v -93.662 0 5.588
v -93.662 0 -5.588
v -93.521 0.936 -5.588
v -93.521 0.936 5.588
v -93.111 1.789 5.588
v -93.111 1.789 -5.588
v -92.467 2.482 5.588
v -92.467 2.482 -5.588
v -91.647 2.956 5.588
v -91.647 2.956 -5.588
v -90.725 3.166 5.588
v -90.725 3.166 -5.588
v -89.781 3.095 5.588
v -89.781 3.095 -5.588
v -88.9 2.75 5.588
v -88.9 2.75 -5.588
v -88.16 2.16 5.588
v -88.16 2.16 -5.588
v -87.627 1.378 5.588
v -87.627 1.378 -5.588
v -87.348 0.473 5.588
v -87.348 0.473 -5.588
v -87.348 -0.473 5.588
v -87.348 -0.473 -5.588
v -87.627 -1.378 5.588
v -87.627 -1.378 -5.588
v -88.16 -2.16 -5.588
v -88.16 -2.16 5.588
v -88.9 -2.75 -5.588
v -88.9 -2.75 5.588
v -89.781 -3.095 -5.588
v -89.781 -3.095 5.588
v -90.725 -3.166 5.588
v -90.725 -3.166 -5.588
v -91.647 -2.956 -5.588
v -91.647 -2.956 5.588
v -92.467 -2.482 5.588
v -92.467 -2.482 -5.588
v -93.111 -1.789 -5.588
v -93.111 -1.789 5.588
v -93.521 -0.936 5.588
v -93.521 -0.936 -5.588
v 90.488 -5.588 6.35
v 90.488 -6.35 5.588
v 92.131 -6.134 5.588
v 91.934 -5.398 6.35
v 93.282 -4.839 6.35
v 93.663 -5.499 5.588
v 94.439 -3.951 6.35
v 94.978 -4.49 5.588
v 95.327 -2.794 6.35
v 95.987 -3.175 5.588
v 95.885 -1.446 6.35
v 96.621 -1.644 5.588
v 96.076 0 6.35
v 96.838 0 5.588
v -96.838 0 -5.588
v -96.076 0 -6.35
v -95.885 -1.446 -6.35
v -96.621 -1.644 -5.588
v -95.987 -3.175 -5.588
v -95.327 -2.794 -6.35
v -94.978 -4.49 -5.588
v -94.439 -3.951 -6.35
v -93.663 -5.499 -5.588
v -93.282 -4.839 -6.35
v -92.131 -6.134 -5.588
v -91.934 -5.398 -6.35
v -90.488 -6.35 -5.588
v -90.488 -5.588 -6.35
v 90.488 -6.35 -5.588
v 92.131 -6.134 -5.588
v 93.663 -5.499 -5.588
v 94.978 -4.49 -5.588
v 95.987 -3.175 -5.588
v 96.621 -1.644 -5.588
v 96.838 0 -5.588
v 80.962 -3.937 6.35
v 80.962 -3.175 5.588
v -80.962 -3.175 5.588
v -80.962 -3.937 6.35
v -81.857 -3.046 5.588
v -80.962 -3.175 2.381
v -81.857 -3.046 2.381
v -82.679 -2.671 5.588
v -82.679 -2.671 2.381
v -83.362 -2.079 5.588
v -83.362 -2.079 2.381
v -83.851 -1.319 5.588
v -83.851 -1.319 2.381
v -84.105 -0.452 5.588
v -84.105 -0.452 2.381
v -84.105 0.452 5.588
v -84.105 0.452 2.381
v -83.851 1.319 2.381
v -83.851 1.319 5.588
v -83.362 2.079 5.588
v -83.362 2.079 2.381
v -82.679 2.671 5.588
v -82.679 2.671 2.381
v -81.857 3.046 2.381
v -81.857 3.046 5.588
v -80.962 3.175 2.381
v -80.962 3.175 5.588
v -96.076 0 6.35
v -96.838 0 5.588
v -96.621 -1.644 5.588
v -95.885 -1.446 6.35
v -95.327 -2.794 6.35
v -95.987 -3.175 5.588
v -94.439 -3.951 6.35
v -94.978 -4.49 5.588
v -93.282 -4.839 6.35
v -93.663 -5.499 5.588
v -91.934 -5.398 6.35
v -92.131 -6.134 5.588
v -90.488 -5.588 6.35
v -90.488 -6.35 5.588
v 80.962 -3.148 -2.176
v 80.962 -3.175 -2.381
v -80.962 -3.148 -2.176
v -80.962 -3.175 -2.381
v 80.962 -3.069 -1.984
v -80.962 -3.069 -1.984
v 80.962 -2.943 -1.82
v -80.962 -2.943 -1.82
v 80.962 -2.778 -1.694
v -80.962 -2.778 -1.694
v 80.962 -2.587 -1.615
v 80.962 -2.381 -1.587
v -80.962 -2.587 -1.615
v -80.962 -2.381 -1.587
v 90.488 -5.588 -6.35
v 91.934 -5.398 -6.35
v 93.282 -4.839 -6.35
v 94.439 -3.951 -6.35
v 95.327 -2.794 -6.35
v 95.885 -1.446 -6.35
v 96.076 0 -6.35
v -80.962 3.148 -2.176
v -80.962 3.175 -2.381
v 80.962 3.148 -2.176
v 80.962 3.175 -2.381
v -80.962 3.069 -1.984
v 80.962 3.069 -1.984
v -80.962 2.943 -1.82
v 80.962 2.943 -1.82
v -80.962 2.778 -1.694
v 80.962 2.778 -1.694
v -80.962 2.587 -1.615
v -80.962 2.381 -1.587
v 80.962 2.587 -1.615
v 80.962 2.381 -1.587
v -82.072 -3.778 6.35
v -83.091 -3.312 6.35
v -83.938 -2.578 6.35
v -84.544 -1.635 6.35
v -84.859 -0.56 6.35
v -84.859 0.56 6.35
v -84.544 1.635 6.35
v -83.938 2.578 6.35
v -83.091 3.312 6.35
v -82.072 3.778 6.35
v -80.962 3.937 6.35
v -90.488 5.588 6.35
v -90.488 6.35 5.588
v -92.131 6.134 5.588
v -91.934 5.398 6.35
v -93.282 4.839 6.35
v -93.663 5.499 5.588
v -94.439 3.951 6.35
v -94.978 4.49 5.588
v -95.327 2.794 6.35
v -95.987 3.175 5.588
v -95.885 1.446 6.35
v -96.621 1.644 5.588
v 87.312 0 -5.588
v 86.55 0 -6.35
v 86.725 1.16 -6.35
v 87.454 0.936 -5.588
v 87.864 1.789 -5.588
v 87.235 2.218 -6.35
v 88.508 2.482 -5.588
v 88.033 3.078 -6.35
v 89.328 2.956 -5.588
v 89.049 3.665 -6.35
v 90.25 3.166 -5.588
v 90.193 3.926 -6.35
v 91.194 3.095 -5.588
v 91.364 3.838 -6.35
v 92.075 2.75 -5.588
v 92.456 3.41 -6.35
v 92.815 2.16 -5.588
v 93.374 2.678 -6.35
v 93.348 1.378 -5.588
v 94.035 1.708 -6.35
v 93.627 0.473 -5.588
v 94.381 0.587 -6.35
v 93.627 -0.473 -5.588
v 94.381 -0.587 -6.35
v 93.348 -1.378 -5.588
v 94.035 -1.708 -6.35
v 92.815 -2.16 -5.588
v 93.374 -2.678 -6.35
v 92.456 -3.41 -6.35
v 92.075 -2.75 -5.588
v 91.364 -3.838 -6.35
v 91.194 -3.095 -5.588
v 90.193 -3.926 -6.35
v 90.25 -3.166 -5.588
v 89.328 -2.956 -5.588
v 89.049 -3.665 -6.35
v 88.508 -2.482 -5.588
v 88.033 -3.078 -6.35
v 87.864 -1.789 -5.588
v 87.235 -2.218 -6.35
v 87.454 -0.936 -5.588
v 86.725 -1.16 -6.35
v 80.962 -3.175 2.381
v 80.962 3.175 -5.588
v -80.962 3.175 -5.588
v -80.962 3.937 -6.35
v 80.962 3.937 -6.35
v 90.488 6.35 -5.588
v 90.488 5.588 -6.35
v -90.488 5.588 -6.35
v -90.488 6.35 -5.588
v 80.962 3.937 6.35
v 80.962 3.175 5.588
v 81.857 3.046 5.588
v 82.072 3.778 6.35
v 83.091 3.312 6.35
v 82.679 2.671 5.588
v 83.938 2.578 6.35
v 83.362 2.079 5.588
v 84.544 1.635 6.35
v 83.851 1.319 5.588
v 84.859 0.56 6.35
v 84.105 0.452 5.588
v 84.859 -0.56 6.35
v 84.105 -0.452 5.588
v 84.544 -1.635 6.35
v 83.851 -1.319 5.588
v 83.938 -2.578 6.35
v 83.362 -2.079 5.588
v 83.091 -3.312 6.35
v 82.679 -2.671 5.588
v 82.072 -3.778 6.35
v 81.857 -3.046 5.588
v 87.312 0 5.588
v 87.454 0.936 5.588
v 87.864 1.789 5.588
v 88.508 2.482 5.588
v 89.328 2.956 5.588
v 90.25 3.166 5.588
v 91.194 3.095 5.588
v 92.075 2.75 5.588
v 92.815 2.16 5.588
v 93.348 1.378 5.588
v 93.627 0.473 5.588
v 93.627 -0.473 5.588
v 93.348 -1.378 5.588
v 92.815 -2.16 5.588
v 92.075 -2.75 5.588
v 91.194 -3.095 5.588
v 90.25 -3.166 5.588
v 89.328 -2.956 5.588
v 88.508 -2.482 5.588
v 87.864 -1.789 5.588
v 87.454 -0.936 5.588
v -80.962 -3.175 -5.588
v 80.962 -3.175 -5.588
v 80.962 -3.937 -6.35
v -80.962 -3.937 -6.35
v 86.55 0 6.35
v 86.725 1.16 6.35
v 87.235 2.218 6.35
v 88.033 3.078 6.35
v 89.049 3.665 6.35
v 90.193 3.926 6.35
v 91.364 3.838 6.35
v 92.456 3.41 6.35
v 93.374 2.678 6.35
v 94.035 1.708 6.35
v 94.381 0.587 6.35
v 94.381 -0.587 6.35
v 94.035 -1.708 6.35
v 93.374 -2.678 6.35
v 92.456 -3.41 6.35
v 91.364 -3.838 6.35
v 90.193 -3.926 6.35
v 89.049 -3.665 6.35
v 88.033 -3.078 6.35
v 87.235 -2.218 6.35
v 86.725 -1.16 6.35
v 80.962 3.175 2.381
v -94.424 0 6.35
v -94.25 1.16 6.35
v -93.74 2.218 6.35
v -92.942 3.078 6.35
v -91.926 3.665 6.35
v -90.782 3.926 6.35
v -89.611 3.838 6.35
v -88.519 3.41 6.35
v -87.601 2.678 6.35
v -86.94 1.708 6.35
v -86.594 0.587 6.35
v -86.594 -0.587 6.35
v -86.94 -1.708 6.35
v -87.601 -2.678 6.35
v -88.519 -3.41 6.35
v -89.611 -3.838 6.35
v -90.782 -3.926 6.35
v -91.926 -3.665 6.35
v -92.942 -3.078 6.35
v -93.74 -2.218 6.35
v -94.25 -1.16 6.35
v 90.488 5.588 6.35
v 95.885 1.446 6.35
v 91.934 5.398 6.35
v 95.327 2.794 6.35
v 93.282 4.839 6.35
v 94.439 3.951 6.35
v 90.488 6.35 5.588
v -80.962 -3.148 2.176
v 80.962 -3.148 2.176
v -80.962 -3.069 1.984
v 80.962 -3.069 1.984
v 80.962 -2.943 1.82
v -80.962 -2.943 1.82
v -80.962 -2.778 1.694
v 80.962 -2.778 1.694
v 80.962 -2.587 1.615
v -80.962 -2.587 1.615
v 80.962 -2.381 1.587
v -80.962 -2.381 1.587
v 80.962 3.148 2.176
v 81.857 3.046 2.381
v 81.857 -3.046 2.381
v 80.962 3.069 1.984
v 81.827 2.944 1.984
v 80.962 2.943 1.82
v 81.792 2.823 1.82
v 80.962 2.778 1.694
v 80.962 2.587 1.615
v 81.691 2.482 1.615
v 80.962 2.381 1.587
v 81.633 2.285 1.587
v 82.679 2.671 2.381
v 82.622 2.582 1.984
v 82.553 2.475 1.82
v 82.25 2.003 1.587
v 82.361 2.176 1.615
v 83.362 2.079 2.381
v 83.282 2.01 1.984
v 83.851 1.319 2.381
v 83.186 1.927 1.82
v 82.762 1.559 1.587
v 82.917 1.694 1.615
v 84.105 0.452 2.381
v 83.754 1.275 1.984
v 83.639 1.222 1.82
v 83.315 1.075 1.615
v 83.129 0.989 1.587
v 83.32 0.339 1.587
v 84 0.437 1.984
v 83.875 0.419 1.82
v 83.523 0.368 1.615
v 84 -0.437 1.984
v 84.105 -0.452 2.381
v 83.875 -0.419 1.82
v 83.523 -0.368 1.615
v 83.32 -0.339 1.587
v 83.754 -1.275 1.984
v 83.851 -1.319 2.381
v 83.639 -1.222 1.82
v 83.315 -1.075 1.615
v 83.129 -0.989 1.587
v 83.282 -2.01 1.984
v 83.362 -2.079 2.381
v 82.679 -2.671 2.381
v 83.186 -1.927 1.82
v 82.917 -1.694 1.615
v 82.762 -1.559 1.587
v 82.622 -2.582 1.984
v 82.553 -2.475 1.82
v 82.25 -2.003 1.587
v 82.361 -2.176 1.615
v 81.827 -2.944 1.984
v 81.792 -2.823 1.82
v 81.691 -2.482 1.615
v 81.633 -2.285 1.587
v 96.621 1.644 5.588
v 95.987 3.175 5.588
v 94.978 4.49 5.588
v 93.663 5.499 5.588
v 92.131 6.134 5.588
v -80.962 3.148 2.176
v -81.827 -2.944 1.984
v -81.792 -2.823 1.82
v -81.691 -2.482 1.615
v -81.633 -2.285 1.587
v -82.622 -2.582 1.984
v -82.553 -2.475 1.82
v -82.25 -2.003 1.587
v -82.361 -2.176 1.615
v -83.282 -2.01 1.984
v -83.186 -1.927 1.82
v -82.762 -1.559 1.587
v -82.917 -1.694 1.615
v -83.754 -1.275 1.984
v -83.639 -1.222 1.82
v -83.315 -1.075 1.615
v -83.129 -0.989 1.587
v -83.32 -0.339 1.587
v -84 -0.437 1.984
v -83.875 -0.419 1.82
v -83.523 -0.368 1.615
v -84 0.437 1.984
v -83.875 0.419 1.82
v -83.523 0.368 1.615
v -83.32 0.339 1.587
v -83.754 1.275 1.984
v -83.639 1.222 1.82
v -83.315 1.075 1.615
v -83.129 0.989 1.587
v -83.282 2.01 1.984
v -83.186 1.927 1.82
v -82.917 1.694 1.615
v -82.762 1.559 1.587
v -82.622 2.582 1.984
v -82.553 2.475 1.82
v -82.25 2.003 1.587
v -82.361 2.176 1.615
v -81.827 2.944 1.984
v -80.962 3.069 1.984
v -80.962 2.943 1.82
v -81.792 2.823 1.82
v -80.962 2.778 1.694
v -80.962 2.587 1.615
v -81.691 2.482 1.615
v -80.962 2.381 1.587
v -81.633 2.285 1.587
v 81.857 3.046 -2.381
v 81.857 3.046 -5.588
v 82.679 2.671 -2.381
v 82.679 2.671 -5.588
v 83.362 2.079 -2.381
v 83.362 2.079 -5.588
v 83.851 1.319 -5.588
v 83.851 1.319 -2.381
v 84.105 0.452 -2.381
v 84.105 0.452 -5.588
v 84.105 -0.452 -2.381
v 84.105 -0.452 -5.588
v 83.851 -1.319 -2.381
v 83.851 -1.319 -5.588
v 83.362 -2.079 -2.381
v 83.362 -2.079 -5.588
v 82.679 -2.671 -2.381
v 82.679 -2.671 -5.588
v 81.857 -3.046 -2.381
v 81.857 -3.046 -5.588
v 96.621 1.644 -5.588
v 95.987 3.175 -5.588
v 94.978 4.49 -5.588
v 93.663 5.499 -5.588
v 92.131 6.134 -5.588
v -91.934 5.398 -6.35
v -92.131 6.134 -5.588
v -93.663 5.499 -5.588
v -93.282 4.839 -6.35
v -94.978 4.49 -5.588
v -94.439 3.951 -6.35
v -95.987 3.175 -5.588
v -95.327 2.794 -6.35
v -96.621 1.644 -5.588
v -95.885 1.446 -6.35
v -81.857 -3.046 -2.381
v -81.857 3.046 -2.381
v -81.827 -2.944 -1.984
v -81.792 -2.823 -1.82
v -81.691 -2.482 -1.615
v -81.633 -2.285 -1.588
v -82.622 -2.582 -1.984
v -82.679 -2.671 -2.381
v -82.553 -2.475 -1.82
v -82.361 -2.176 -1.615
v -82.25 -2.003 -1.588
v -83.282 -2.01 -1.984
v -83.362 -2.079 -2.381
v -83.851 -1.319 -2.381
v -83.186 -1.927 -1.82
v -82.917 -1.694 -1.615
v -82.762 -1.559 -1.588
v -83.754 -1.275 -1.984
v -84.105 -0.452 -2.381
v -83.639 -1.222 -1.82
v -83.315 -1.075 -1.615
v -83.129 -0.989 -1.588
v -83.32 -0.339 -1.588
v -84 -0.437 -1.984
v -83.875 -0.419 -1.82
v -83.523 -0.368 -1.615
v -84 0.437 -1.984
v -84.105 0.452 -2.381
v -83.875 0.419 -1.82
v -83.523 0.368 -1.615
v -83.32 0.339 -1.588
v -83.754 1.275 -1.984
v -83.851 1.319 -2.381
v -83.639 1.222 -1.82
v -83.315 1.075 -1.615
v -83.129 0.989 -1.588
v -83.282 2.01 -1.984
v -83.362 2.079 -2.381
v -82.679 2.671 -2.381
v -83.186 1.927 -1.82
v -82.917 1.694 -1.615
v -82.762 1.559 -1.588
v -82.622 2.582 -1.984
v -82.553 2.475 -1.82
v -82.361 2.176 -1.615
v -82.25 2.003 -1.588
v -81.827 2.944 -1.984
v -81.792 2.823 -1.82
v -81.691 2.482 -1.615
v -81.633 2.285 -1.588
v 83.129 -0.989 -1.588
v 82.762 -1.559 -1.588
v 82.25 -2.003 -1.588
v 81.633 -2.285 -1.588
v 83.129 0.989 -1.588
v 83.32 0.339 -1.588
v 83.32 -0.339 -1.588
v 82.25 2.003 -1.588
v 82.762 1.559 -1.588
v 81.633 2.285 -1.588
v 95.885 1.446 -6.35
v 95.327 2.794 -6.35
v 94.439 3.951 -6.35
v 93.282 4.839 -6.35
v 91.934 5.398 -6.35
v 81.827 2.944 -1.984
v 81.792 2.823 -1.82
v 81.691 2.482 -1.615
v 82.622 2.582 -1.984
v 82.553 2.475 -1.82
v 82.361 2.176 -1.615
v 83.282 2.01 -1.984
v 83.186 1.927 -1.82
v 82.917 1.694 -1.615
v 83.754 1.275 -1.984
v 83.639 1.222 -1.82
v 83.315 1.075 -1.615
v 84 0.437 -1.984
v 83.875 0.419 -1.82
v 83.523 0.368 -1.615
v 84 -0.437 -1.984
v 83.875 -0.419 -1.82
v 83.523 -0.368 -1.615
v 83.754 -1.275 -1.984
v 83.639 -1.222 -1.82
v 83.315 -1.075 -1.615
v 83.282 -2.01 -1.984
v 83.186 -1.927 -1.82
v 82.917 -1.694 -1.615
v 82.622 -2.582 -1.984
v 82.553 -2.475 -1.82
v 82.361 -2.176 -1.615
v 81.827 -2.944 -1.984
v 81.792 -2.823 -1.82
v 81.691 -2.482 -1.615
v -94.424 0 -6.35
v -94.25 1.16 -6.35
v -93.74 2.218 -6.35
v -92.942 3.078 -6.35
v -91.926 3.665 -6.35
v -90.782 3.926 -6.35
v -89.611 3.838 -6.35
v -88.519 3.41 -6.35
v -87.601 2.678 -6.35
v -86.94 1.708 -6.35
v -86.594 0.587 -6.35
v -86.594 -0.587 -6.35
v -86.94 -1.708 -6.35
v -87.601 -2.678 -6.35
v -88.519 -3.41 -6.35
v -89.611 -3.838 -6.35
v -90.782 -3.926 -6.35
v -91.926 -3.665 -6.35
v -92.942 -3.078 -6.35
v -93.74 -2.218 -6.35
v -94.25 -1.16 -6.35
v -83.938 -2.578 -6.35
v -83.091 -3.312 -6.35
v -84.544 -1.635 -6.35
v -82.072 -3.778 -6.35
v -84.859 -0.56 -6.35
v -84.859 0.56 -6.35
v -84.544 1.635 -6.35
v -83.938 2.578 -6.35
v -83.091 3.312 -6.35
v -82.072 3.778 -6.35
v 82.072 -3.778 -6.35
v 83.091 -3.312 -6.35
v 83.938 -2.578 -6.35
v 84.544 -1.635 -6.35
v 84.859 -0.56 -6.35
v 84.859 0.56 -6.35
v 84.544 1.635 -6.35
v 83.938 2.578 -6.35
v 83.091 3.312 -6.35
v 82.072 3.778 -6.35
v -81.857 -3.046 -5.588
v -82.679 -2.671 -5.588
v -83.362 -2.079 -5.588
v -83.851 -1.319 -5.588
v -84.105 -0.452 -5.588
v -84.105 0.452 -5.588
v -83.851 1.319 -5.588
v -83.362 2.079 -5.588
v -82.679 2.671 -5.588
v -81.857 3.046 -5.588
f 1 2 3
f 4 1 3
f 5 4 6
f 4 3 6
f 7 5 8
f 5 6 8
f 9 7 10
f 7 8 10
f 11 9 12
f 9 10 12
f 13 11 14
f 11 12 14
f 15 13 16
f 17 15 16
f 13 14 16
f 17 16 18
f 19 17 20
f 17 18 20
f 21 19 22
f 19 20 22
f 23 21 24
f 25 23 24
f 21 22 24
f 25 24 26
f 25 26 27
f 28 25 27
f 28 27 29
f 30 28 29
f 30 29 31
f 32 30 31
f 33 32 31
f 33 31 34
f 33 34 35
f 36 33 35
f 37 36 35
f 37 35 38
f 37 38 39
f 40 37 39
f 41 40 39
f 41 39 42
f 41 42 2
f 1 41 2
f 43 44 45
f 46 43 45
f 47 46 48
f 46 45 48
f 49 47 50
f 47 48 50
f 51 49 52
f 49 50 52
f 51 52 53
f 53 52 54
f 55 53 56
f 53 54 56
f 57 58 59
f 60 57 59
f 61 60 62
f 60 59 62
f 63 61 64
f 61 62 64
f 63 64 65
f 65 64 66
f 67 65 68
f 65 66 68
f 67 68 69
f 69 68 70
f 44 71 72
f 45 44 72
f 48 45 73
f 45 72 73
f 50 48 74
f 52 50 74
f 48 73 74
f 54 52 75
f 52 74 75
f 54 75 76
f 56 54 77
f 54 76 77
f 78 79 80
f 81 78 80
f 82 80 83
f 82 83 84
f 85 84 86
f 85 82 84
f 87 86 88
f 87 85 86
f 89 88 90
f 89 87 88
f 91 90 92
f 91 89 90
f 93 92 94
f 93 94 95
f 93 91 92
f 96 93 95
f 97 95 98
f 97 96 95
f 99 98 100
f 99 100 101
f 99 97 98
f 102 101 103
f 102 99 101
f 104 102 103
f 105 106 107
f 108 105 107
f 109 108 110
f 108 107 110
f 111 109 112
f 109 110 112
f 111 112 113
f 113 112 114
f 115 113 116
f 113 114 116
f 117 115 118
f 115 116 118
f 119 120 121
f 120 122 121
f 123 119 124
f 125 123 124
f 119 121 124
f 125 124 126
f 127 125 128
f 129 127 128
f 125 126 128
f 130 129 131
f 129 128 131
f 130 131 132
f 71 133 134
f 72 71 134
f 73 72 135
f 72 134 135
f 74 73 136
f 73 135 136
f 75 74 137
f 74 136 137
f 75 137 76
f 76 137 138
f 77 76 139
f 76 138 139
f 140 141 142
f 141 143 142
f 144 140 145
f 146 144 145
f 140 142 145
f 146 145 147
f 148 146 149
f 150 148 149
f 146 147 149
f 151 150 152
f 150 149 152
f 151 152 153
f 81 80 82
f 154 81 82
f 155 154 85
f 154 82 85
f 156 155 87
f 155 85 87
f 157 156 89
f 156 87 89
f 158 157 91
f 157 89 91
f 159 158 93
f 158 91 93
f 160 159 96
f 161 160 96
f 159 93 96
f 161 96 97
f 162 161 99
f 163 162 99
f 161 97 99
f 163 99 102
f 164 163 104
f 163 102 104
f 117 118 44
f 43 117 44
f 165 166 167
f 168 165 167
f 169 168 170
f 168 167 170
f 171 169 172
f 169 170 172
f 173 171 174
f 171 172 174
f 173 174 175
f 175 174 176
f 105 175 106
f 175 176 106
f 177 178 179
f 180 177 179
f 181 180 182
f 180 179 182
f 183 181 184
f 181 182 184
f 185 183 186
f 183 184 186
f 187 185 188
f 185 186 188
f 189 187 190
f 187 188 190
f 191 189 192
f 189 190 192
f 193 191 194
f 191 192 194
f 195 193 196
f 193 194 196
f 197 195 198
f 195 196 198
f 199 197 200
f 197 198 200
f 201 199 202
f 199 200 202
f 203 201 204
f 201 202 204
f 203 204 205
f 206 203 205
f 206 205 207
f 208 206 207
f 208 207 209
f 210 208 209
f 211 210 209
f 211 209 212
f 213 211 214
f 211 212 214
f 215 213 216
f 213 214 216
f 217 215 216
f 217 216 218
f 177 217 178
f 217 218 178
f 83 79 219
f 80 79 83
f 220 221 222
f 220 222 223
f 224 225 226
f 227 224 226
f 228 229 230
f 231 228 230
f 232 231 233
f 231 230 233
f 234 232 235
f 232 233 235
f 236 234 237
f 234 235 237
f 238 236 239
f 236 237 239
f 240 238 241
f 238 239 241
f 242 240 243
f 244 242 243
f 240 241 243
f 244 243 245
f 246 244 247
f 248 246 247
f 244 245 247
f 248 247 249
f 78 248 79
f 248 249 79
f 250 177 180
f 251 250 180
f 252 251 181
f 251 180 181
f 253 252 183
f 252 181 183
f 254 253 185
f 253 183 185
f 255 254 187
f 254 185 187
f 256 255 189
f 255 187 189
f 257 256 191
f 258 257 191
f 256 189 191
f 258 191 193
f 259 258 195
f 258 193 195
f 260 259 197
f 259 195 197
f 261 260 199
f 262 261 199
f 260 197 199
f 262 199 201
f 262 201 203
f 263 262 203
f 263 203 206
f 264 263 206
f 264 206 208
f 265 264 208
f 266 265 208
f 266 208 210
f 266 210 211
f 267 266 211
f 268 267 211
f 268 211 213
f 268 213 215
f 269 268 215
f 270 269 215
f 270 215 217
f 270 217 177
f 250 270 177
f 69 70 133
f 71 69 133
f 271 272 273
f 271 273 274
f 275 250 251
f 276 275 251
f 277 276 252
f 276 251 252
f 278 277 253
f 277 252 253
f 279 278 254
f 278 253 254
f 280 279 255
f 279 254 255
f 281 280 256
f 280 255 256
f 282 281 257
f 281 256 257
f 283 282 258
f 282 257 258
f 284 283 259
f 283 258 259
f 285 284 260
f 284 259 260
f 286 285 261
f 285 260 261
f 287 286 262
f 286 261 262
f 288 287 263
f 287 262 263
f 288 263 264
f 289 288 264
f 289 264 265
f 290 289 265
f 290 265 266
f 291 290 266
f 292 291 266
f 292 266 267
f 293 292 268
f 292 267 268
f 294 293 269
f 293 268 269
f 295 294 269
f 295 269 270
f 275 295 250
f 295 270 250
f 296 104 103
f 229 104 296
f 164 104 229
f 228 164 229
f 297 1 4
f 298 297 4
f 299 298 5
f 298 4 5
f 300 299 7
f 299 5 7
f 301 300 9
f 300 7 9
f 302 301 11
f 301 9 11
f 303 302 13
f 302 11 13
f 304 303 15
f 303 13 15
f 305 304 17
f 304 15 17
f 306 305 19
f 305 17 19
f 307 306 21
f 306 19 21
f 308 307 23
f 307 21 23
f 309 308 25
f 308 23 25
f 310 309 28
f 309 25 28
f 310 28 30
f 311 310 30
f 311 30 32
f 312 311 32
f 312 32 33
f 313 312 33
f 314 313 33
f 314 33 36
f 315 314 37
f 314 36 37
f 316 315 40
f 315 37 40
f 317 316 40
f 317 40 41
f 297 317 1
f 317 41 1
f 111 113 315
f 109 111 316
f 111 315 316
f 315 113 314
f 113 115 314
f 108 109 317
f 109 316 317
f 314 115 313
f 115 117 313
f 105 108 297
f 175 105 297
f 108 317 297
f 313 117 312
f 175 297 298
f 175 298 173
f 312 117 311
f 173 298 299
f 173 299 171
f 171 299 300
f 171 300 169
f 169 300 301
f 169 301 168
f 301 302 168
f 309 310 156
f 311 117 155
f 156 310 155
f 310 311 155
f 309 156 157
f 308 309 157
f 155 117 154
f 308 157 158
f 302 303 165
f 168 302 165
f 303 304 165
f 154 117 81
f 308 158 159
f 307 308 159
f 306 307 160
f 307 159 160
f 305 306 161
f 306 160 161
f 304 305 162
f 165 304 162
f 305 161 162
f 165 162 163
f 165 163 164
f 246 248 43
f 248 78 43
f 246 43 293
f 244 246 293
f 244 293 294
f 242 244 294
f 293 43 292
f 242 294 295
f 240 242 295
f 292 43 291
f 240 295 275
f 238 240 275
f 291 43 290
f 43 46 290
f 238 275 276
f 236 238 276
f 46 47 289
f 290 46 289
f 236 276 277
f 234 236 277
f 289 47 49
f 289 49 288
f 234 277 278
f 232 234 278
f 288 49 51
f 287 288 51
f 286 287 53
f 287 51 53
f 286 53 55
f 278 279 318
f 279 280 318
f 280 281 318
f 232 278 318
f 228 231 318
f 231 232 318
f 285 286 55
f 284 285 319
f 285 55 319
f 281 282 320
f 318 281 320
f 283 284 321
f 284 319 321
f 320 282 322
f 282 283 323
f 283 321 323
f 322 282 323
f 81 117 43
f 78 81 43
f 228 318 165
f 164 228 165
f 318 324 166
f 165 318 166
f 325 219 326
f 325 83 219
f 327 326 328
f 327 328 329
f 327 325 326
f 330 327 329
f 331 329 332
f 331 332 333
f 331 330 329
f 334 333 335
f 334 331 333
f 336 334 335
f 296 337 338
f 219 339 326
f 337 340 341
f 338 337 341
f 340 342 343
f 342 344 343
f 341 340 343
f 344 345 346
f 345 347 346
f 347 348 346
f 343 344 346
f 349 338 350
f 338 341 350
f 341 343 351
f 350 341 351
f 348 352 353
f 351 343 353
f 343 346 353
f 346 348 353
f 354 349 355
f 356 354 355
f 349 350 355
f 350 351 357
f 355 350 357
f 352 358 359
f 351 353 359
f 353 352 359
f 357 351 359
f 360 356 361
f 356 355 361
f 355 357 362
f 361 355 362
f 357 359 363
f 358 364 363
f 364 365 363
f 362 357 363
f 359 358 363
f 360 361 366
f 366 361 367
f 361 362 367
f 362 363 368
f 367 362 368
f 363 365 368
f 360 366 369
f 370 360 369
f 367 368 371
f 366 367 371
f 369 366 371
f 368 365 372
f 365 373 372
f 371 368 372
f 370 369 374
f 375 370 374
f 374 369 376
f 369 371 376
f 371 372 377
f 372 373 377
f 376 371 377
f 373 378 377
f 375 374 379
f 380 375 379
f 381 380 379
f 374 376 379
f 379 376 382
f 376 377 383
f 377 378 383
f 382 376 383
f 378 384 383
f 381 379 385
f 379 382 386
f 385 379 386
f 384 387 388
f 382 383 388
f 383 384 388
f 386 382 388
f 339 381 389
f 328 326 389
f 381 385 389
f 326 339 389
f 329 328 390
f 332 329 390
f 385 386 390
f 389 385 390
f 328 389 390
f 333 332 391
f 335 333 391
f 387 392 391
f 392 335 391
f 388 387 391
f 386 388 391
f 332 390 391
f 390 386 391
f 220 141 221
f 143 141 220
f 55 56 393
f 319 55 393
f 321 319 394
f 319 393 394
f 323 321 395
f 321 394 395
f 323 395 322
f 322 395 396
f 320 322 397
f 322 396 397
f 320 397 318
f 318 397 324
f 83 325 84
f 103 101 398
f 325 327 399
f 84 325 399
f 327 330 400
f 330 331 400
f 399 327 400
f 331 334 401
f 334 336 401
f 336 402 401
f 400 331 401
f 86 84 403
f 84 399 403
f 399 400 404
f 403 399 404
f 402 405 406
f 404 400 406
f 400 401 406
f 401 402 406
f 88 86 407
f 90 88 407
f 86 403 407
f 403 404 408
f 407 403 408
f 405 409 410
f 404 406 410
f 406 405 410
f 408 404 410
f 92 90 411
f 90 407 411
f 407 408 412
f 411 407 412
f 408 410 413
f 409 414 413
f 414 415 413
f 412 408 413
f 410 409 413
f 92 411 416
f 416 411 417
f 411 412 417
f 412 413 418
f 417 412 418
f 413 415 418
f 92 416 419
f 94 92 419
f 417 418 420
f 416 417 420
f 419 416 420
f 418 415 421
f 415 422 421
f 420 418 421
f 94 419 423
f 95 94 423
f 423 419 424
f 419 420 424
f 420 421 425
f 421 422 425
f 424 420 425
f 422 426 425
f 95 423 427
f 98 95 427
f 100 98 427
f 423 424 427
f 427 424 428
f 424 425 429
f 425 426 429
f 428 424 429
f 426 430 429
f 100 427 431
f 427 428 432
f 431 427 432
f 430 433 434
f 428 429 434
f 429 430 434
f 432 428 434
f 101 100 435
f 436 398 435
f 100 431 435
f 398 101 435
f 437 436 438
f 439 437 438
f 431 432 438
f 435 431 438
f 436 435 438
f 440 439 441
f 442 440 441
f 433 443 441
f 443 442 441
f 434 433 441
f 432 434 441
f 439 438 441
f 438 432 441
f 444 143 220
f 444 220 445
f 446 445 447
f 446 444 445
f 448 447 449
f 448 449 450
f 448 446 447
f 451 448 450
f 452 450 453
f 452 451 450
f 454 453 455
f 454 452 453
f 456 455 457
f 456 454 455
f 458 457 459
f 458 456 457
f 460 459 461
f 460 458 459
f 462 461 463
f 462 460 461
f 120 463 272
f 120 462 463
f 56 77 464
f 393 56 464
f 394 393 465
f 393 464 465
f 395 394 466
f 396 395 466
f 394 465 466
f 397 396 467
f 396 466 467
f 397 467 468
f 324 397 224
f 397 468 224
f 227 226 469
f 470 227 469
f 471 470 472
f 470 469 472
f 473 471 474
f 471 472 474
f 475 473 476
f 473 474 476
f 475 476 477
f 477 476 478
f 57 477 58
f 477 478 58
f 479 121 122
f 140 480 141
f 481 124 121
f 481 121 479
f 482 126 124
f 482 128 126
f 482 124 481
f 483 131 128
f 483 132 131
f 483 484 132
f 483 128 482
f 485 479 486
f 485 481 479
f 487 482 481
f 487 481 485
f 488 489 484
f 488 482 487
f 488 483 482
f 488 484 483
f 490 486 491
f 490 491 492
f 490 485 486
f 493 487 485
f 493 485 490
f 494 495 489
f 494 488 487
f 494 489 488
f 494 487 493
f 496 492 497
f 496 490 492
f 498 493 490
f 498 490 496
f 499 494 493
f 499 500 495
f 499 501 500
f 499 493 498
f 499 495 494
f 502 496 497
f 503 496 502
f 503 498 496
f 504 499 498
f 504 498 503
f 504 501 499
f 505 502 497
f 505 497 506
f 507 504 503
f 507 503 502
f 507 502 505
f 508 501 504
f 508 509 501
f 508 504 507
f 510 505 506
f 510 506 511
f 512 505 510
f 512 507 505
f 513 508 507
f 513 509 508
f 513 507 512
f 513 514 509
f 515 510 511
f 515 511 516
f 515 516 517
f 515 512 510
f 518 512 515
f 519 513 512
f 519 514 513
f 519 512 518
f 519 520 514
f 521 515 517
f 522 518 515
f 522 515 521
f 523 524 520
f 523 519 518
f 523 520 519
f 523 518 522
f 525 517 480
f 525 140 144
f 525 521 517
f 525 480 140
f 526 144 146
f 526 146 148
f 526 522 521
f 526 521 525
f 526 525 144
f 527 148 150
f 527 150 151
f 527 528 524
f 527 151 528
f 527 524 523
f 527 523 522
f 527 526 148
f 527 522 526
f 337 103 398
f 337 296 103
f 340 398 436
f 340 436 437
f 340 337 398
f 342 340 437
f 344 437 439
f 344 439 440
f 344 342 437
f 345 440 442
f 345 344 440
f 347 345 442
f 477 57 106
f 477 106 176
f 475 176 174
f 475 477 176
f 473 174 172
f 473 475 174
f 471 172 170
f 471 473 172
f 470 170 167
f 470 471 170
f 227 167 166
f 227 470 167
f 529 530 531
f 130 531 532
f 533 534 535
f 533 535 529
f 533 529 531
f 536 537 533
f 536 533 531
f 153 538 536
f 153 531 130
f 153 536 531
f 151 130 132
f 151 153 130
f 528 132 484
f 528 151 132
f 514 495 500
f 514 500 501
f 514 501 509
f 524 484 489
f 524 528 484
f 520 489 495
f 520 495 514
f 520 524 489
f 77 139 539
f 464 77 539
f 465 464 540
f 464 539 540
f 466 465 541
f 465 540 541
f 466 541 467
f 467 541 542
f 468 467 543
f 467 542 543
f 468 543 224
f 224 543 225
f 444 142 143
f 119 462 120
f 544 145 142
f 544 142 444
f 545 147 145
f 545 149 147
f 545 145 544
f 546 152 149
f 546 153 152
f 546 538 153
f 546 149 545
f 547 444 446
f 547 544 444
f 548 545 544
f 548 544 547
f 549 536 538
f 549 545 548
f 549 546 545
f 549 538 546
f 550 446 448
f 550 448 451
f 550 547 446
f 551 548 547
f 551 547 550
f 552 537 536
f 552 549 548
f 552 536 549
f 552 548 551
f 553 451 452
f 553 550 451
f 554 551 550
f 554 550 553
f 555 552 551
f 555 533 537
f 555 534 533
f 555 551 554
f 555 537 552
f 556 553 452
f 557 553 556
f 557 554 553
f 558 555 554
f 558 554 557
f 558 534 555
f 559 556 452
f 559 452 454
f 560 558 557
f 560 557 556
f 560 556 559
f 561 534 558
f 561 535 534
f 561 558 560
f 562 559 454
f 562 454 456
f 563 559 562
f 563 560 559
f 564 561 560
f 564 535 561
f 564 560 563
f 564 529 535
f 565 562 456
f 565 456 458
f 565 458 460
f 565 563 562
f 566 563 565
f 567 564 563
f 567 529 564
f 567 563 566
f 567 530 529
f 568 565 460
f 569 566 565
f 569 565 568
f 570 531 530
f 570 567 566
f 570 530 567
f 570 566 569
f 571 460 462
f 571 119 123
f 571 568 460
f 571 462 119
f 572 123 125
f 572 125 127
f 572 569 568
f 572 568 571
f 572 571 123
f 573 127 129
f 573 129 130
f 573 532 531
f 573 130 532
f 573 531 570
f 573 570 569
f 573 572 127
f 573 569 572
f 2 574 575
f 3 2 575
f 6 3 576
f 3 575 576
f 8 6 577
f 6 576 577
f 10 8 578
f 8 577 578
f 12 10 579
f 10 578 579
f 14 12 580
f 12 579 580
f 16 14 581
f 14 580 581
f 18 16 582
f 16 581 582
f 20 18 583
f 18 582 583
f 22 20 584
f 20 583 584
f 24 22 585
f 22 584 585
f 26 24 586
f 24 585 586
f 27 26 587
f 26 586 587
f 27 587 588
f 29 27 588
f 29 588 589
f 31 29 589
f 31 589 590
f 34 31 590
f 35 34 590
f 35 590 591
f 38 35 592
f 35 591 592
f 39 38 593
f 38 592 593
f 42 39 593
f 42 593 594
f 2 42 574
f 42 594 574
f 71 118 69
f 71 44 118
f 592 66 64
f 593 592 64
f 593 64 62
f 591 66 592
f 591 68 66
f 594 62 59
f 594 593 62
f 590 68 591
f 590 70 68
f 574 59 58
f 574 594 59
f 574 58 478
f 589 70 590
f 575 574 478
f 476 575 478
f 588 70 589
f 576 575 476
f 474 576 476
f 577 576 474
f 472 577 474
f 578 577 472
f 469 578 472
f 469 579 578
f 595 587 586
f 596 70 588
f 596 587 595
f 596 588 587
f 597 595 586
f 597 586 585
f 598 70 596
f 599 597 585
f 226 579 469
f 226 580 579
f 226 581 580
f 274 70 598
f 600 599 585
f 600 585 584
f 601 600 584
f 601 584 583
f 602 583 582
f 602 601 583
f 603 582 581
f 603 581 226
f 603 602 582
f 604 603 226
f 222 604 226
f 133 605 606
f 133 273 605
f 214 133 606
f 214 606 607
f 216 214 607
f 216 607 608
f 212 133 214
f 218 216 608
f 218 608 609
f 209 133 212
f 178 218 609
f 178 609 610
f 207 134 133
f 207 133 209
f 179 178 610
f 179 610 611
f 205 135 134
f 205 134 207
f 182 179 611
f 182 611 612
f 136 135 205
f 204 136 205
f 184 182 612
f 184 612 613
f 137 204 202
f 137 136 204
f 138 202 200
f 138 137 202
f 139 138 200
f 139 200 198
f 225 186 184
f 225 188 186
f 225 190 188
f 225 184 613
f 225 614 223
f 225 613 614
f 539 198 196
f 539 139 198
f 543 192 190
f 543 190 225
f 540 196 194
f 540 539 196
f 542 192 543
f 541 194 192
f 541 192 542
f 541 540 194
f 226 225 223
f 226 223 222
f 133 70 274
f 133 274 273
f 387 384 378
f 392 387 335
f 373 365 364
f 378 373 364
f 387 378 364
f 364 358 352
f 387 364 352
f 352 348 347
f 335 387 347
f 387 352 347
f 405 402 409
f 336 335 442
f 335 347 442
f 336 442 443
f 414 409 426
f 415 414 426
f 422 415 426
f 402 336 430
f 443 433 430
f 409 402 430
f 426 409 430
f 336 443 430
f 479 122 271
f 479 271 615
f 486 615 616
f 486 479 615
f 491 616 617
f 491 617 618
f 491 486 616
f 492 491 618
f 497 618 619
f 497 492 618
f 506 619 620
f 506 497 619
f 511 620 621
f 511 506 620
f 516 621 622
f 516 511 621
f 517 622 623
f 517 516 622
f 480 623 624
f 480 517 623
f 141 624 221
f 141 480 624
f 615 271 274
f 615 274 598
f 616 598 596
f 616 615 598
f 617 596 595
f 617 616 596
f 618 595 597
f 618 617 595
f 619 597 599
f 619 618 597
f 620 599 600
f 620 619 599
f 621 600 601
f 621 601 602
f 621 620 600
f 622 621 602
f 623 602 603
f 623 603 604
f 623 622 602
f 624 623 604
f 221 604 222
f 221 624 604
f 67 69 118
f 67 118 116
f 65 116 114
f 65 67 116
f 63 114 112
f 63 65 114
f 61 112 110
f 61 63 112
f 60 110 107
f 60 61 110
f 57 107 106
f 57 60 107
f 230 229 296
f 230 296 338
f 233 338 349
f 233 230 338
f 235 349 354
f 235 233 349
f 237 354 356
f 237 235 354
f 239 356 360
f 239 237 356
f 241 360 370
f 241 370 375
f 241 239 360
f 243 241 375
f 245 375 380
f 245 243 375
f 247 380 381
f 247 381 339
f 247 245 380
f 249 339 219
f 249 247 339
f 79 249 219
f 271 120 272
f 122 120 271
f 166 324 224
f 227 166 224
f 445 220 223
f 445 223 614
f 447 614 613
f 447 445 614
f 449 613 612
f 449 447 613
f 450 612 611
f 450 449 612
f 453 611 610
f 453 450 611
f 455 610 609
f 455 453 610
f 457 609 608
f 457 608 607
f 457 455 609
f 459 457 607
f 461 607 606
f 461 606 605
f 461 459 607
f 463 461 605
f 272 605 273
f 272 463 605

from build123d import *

# Parameters (mm, degrees)
SKETCH1_W                   = 12.7
SKETCH1_H                   = 12.7
BOSS_EXTRUDE1_DEPTH         = 96.8375
F_1_4_0_25_DIAMETER_HOLE1_D = 6.35
CUT_EXTRUDE1_START          = 6.35
CUT_EXTRUDE1_DEPTH          = 4.7625
CUT_EXTRUDE2_START          = -1.5875
CUT_EXTRUDE2_DEPTH          = 4.7625
FILLET1_R                   = 6.35
FILLET2_R                   = 0.79375
CHAMFER1_SIZE               = 0.762


with BuildPart() as part:
    # Sketch1 → Boss-Extrude1 (new, symmetric)
    with BuildSketch(Plane(origin=(0, 0, 0), x_dir=(0, 0, -1), z_dir=(1, 0, 0))):
        Rectangle(SKETCH1_W, SKETCH1_H)
    extrude(amount=BOSS_EXTRUDE1_DEPTH, both=True)

    # 1/4 (0.25) Diameter Hole1 (through all)
    with Locations(Plane.XY.offset(6.35)):
        with Locations((-90.4875, 0), (90.4875, 0)):
            Hole(F_1_4_0_25_DIAMETER_HOLE1_D / 2)

    # Sketch6 → Cut-Extrude1 (cut)
    with BuildSketch(Plane.XY.offset(CUT_EXTRUDE1_START)):
        with BuildLine():
            Line((-80.9625, 3.175), (80.9625, 3.175))
            ThreePointArc((80.9625, 3.175), (84.1375, 0), (80.9625, -3.175))
            Line((80.9625, -3.175), (-80.9625, -3.175))
            ThreePointArc((-80.9625, -3.175), (-84.1375, 0), (-80.9625, 3.175))
        make_face()
    extrude(amount=-CUT_EXTRUDE1_DEPTH, mode=Mode.SUBTRACT)

    # Sketch6<3> → Cut-Extrude2 (cut)
    with BuildSketch(Plane.XY.offset(CUT_EXTRUDE2_START)):
        with BuildLine():
            Line((-80.9625, 3.175), (80.9625, 3.175))
            ThreePointArc((80.9625, 3.175), (84.1375, 0), (80.9625, -3.175))
            Line((80.9625, -3.175), (-80.9625, -3.175))
            ThreePointArc((-80.9625, -3.175), (-84.1375, 0), (-80.9625, 3.175))
        make_face()
    extrude(amount=-CUT_EXTRUDE2_DEPTH, mode=Mode.SUBTRACT)

    # Fillet1
    fillet1_edges = [part.edges().sort_by_distance(p)[0] for p in [
        (96.8375, -6.35, 0),
        (96.8375, 6.35, 0),
        (-96.8375, -6.35, 0),
        (-96.8375, 6.35, 0),
    ]]
    fillet(fillet1_edges, radius=FILLET1_R - 0.0001)  # a hair under: the kernel refuses the full size

    # Fillet2
    fillet2_edges = [part.edges().sort_by_distance(p)[0] for p in [
        (84.1375, 0, 1.5875),
        (-84.1375, 0, 1.5875),
        (0, 3.175, 1.5875),
        (0, -3.175, 1.5875),
        (0, 3.175, -1.5875),
        (-84.1375, 0, -1.5875),
        (0, -3.175, -1.5875),
        (84.1375, 0, -1.5875),
    ]]
    fillet(fillet2_edges, radius=FILLET2_R)

    # Chamfer1
    chamfer1_edges = [part.edges().sort_by_distance(p)[0] for p in [
        (93.6625, 0, 6.35),
        (93.6625, 0, -6.35),
        (-87.3125, 0, 6.35),
        (-87.3125, 0, -6.35),
        (0, -3.175, 6.35),
        (84.1375, 0, 6.35),
        (0, 3.175, 6.35),
        (-84.1375, 0, 6.35),
        (0, 3.175, -6.35),
        (-84.1375, 0, -6.35),
        (0, -3.175, -6.35),
        (84.1375, 0, -6.35),
        (0, 6.35, -6.35),
        (0, -6.35, -6.35),
        (-94.97765735, 4.49015735, -6.35),
        (-94.97765735, -4.49015735, -6.35),
        (94.97765735, 4.49015735, -6.35),
        (94.97765735, -4.49015735, -6.35),
        (0, -6.35, 6.35),
        (0, 6.35, 6.35),
        (-94.97765735, 4.49015735, 6.35),
        (-94.97765735, -4.49015735, 6.35),
        (94.97765735, 4.49015735, 6.35),
        (94.97765735, -4.49015735, 6.35),
    ]]
    chamfer(chamfer1_edges, length=CHAMFER1_SIZE)


solid = part.part
